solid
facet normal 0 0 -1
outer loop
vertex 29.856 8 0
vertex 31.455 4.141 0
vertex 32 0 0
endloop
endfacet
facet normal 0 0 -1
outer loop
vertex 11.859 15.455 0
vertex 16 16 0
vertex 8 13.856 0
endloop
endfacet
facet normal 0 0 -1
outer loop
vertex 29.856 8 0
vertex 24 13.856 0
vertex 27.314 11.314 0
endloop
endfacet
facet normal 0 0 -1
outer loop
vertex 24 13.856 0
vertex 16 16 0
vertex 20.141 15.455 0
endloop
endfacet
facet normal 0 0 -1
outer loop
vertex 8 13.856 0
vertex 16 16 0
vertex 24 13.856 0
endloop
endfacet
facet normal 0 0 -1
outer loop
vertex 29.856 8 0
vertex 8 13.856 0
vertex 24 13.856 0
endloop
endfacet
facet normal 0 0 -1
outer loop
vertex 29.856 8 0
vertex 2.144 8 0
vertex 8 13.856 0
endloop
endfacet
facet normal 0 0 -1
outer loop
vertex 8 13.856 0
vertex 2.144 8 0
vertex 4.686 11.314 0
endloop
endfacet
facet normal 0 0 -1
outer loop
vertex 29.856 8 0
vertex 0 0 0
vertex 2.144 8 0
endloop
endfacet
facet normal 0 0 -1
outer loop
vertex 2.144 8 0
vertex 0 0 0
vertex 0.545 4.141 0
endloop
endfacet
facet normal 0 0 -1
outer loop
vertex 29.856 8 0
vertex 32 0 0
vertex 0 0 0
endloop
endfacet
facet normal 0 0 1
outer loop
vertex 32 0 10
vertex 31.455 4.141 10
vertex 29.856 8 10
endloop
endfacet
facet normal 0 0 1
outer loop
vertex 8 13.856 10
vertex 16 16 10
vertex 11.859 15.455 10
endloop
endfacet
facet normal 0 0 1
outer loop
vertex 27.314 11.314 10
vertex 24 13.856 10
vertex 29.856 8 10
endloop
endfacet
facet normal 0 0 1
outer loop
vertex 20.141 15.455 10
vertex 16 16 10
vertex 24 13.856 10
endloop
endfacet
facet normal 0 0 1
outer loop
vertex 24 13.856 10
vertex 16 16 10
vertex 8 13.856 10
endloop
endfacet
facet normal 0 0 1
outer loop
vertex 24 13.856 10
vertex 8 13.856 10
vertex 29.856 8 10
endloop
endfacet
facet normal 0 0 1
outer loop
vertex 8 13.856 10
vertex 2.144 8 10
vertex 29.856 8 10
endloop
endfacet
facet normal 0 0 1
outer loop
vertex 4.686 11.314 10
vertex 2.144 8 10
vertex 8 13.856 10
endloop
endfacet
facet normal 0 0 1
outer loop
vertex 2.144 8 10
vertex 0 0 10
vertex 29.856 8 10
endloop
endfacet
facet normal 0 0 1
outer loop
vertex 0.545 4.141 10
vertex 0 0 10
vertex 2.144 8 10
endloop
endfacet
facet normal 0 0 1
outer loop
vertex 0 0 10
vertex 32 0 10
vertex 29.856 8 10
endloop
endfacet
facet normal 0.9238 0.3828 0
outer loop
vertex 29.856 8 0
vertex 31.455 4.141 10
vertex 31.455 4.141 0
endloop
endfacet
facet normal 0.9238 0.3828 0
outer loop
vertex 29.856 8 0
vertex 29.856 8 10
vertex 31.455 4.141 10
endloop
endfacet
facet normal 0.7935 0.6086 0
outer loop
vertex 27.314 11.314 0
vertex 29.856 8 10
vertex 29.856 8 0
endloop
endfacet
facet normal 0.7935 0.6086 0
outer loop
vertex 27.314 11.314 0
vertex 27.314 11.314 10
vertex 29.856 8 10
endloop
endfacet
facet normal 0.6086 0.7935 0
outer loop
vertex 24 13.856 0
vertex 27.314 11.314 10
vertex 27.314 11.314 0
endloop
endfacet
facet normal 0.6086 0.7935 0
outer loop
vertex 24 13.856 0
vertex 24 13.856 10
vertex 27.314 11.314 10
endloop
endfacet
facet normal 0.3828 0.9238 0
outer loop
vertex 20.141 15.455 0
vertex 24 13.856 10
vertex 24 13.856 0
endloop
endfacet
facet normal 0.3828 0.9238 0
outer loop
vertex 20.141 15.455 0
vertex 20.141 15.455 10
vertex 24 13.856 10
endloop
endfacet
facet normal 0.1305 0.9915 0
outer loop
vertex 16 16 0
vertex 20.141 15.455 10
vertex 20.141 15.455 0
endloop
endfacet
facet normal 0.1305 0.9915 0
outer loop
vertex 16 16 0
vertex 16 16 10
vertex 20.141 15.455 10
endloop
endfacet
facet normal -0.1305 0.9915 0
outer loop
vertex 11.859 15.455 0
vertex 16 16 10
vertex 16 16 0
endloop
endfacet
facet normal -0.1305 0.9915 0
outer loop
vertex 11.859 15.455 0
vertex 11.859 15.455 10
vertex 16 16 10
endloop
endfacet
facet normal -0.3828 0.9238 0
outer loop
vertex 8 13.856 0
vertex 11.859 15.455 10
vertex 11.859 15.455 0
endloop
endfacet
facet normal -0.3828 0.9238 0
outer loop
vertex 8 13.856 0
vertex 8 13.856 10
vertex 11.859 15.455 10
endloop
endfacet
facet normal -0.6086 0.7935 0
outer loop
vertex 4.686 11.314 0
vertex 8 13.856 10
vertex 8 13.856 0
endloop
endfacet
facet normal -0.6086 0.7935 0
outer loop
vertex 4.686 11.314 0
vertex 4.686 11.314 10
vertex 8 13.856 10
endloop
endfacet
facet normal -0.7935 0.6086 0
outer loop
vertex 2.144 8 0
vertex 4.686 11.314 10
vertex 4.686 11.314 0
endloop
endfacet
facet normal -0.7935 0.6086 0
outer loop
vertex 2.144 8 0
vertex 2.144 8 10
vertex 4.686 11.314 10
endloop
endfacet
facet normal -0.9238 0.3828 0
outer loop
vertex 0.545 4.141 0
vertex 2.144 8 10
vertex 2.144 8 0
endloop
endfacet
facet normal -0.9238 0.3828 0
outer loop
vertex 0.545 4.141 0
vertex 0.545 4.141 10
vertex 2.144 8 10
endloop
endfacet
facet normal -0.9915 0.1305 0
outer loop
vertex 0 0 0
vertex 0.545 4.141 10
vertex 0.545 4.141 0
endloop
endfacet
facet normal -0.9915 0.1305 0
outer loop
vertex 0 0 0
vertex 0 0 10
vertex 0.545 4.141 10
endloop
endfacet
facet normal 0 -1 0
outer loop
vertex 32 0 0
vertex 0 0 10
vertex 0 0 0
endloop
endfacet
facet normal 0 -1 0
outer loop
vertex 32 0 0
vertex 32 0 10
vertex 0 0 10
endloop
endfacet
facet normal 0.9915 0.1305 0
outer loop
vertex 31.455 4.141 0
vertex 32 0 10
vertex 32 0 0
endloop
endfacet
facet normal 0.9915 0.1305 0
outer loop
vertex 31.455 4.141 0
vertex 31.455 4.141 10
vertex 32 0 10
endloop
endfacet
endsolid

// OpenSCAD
$fn = 32;

// ----------------------------------------------------------------------
// Key bar: woodruff key, 10 mm thick
// ----------------------------------------------------------------------

// --- parameters (mm) ---
profile_height = 10;      // extrusion height
profile_points = 13;      // points of the closed outline

profile = [[32, 0], [31.455, 4.141], [29.856, 8], [27.314, 11.314], [24, 13.856], [20.141, 15.455], [16, 16], [11.859, 15.455], [8, 13.856], [4.686, 11.314], [2.144, 8], [0.545, 4.141], [0, 0]];  // single closed polygon, 13 points, counter clockwise

// --- the one profile operation ---
linear_extrude(height = profile_height) polygon(points = profile);
